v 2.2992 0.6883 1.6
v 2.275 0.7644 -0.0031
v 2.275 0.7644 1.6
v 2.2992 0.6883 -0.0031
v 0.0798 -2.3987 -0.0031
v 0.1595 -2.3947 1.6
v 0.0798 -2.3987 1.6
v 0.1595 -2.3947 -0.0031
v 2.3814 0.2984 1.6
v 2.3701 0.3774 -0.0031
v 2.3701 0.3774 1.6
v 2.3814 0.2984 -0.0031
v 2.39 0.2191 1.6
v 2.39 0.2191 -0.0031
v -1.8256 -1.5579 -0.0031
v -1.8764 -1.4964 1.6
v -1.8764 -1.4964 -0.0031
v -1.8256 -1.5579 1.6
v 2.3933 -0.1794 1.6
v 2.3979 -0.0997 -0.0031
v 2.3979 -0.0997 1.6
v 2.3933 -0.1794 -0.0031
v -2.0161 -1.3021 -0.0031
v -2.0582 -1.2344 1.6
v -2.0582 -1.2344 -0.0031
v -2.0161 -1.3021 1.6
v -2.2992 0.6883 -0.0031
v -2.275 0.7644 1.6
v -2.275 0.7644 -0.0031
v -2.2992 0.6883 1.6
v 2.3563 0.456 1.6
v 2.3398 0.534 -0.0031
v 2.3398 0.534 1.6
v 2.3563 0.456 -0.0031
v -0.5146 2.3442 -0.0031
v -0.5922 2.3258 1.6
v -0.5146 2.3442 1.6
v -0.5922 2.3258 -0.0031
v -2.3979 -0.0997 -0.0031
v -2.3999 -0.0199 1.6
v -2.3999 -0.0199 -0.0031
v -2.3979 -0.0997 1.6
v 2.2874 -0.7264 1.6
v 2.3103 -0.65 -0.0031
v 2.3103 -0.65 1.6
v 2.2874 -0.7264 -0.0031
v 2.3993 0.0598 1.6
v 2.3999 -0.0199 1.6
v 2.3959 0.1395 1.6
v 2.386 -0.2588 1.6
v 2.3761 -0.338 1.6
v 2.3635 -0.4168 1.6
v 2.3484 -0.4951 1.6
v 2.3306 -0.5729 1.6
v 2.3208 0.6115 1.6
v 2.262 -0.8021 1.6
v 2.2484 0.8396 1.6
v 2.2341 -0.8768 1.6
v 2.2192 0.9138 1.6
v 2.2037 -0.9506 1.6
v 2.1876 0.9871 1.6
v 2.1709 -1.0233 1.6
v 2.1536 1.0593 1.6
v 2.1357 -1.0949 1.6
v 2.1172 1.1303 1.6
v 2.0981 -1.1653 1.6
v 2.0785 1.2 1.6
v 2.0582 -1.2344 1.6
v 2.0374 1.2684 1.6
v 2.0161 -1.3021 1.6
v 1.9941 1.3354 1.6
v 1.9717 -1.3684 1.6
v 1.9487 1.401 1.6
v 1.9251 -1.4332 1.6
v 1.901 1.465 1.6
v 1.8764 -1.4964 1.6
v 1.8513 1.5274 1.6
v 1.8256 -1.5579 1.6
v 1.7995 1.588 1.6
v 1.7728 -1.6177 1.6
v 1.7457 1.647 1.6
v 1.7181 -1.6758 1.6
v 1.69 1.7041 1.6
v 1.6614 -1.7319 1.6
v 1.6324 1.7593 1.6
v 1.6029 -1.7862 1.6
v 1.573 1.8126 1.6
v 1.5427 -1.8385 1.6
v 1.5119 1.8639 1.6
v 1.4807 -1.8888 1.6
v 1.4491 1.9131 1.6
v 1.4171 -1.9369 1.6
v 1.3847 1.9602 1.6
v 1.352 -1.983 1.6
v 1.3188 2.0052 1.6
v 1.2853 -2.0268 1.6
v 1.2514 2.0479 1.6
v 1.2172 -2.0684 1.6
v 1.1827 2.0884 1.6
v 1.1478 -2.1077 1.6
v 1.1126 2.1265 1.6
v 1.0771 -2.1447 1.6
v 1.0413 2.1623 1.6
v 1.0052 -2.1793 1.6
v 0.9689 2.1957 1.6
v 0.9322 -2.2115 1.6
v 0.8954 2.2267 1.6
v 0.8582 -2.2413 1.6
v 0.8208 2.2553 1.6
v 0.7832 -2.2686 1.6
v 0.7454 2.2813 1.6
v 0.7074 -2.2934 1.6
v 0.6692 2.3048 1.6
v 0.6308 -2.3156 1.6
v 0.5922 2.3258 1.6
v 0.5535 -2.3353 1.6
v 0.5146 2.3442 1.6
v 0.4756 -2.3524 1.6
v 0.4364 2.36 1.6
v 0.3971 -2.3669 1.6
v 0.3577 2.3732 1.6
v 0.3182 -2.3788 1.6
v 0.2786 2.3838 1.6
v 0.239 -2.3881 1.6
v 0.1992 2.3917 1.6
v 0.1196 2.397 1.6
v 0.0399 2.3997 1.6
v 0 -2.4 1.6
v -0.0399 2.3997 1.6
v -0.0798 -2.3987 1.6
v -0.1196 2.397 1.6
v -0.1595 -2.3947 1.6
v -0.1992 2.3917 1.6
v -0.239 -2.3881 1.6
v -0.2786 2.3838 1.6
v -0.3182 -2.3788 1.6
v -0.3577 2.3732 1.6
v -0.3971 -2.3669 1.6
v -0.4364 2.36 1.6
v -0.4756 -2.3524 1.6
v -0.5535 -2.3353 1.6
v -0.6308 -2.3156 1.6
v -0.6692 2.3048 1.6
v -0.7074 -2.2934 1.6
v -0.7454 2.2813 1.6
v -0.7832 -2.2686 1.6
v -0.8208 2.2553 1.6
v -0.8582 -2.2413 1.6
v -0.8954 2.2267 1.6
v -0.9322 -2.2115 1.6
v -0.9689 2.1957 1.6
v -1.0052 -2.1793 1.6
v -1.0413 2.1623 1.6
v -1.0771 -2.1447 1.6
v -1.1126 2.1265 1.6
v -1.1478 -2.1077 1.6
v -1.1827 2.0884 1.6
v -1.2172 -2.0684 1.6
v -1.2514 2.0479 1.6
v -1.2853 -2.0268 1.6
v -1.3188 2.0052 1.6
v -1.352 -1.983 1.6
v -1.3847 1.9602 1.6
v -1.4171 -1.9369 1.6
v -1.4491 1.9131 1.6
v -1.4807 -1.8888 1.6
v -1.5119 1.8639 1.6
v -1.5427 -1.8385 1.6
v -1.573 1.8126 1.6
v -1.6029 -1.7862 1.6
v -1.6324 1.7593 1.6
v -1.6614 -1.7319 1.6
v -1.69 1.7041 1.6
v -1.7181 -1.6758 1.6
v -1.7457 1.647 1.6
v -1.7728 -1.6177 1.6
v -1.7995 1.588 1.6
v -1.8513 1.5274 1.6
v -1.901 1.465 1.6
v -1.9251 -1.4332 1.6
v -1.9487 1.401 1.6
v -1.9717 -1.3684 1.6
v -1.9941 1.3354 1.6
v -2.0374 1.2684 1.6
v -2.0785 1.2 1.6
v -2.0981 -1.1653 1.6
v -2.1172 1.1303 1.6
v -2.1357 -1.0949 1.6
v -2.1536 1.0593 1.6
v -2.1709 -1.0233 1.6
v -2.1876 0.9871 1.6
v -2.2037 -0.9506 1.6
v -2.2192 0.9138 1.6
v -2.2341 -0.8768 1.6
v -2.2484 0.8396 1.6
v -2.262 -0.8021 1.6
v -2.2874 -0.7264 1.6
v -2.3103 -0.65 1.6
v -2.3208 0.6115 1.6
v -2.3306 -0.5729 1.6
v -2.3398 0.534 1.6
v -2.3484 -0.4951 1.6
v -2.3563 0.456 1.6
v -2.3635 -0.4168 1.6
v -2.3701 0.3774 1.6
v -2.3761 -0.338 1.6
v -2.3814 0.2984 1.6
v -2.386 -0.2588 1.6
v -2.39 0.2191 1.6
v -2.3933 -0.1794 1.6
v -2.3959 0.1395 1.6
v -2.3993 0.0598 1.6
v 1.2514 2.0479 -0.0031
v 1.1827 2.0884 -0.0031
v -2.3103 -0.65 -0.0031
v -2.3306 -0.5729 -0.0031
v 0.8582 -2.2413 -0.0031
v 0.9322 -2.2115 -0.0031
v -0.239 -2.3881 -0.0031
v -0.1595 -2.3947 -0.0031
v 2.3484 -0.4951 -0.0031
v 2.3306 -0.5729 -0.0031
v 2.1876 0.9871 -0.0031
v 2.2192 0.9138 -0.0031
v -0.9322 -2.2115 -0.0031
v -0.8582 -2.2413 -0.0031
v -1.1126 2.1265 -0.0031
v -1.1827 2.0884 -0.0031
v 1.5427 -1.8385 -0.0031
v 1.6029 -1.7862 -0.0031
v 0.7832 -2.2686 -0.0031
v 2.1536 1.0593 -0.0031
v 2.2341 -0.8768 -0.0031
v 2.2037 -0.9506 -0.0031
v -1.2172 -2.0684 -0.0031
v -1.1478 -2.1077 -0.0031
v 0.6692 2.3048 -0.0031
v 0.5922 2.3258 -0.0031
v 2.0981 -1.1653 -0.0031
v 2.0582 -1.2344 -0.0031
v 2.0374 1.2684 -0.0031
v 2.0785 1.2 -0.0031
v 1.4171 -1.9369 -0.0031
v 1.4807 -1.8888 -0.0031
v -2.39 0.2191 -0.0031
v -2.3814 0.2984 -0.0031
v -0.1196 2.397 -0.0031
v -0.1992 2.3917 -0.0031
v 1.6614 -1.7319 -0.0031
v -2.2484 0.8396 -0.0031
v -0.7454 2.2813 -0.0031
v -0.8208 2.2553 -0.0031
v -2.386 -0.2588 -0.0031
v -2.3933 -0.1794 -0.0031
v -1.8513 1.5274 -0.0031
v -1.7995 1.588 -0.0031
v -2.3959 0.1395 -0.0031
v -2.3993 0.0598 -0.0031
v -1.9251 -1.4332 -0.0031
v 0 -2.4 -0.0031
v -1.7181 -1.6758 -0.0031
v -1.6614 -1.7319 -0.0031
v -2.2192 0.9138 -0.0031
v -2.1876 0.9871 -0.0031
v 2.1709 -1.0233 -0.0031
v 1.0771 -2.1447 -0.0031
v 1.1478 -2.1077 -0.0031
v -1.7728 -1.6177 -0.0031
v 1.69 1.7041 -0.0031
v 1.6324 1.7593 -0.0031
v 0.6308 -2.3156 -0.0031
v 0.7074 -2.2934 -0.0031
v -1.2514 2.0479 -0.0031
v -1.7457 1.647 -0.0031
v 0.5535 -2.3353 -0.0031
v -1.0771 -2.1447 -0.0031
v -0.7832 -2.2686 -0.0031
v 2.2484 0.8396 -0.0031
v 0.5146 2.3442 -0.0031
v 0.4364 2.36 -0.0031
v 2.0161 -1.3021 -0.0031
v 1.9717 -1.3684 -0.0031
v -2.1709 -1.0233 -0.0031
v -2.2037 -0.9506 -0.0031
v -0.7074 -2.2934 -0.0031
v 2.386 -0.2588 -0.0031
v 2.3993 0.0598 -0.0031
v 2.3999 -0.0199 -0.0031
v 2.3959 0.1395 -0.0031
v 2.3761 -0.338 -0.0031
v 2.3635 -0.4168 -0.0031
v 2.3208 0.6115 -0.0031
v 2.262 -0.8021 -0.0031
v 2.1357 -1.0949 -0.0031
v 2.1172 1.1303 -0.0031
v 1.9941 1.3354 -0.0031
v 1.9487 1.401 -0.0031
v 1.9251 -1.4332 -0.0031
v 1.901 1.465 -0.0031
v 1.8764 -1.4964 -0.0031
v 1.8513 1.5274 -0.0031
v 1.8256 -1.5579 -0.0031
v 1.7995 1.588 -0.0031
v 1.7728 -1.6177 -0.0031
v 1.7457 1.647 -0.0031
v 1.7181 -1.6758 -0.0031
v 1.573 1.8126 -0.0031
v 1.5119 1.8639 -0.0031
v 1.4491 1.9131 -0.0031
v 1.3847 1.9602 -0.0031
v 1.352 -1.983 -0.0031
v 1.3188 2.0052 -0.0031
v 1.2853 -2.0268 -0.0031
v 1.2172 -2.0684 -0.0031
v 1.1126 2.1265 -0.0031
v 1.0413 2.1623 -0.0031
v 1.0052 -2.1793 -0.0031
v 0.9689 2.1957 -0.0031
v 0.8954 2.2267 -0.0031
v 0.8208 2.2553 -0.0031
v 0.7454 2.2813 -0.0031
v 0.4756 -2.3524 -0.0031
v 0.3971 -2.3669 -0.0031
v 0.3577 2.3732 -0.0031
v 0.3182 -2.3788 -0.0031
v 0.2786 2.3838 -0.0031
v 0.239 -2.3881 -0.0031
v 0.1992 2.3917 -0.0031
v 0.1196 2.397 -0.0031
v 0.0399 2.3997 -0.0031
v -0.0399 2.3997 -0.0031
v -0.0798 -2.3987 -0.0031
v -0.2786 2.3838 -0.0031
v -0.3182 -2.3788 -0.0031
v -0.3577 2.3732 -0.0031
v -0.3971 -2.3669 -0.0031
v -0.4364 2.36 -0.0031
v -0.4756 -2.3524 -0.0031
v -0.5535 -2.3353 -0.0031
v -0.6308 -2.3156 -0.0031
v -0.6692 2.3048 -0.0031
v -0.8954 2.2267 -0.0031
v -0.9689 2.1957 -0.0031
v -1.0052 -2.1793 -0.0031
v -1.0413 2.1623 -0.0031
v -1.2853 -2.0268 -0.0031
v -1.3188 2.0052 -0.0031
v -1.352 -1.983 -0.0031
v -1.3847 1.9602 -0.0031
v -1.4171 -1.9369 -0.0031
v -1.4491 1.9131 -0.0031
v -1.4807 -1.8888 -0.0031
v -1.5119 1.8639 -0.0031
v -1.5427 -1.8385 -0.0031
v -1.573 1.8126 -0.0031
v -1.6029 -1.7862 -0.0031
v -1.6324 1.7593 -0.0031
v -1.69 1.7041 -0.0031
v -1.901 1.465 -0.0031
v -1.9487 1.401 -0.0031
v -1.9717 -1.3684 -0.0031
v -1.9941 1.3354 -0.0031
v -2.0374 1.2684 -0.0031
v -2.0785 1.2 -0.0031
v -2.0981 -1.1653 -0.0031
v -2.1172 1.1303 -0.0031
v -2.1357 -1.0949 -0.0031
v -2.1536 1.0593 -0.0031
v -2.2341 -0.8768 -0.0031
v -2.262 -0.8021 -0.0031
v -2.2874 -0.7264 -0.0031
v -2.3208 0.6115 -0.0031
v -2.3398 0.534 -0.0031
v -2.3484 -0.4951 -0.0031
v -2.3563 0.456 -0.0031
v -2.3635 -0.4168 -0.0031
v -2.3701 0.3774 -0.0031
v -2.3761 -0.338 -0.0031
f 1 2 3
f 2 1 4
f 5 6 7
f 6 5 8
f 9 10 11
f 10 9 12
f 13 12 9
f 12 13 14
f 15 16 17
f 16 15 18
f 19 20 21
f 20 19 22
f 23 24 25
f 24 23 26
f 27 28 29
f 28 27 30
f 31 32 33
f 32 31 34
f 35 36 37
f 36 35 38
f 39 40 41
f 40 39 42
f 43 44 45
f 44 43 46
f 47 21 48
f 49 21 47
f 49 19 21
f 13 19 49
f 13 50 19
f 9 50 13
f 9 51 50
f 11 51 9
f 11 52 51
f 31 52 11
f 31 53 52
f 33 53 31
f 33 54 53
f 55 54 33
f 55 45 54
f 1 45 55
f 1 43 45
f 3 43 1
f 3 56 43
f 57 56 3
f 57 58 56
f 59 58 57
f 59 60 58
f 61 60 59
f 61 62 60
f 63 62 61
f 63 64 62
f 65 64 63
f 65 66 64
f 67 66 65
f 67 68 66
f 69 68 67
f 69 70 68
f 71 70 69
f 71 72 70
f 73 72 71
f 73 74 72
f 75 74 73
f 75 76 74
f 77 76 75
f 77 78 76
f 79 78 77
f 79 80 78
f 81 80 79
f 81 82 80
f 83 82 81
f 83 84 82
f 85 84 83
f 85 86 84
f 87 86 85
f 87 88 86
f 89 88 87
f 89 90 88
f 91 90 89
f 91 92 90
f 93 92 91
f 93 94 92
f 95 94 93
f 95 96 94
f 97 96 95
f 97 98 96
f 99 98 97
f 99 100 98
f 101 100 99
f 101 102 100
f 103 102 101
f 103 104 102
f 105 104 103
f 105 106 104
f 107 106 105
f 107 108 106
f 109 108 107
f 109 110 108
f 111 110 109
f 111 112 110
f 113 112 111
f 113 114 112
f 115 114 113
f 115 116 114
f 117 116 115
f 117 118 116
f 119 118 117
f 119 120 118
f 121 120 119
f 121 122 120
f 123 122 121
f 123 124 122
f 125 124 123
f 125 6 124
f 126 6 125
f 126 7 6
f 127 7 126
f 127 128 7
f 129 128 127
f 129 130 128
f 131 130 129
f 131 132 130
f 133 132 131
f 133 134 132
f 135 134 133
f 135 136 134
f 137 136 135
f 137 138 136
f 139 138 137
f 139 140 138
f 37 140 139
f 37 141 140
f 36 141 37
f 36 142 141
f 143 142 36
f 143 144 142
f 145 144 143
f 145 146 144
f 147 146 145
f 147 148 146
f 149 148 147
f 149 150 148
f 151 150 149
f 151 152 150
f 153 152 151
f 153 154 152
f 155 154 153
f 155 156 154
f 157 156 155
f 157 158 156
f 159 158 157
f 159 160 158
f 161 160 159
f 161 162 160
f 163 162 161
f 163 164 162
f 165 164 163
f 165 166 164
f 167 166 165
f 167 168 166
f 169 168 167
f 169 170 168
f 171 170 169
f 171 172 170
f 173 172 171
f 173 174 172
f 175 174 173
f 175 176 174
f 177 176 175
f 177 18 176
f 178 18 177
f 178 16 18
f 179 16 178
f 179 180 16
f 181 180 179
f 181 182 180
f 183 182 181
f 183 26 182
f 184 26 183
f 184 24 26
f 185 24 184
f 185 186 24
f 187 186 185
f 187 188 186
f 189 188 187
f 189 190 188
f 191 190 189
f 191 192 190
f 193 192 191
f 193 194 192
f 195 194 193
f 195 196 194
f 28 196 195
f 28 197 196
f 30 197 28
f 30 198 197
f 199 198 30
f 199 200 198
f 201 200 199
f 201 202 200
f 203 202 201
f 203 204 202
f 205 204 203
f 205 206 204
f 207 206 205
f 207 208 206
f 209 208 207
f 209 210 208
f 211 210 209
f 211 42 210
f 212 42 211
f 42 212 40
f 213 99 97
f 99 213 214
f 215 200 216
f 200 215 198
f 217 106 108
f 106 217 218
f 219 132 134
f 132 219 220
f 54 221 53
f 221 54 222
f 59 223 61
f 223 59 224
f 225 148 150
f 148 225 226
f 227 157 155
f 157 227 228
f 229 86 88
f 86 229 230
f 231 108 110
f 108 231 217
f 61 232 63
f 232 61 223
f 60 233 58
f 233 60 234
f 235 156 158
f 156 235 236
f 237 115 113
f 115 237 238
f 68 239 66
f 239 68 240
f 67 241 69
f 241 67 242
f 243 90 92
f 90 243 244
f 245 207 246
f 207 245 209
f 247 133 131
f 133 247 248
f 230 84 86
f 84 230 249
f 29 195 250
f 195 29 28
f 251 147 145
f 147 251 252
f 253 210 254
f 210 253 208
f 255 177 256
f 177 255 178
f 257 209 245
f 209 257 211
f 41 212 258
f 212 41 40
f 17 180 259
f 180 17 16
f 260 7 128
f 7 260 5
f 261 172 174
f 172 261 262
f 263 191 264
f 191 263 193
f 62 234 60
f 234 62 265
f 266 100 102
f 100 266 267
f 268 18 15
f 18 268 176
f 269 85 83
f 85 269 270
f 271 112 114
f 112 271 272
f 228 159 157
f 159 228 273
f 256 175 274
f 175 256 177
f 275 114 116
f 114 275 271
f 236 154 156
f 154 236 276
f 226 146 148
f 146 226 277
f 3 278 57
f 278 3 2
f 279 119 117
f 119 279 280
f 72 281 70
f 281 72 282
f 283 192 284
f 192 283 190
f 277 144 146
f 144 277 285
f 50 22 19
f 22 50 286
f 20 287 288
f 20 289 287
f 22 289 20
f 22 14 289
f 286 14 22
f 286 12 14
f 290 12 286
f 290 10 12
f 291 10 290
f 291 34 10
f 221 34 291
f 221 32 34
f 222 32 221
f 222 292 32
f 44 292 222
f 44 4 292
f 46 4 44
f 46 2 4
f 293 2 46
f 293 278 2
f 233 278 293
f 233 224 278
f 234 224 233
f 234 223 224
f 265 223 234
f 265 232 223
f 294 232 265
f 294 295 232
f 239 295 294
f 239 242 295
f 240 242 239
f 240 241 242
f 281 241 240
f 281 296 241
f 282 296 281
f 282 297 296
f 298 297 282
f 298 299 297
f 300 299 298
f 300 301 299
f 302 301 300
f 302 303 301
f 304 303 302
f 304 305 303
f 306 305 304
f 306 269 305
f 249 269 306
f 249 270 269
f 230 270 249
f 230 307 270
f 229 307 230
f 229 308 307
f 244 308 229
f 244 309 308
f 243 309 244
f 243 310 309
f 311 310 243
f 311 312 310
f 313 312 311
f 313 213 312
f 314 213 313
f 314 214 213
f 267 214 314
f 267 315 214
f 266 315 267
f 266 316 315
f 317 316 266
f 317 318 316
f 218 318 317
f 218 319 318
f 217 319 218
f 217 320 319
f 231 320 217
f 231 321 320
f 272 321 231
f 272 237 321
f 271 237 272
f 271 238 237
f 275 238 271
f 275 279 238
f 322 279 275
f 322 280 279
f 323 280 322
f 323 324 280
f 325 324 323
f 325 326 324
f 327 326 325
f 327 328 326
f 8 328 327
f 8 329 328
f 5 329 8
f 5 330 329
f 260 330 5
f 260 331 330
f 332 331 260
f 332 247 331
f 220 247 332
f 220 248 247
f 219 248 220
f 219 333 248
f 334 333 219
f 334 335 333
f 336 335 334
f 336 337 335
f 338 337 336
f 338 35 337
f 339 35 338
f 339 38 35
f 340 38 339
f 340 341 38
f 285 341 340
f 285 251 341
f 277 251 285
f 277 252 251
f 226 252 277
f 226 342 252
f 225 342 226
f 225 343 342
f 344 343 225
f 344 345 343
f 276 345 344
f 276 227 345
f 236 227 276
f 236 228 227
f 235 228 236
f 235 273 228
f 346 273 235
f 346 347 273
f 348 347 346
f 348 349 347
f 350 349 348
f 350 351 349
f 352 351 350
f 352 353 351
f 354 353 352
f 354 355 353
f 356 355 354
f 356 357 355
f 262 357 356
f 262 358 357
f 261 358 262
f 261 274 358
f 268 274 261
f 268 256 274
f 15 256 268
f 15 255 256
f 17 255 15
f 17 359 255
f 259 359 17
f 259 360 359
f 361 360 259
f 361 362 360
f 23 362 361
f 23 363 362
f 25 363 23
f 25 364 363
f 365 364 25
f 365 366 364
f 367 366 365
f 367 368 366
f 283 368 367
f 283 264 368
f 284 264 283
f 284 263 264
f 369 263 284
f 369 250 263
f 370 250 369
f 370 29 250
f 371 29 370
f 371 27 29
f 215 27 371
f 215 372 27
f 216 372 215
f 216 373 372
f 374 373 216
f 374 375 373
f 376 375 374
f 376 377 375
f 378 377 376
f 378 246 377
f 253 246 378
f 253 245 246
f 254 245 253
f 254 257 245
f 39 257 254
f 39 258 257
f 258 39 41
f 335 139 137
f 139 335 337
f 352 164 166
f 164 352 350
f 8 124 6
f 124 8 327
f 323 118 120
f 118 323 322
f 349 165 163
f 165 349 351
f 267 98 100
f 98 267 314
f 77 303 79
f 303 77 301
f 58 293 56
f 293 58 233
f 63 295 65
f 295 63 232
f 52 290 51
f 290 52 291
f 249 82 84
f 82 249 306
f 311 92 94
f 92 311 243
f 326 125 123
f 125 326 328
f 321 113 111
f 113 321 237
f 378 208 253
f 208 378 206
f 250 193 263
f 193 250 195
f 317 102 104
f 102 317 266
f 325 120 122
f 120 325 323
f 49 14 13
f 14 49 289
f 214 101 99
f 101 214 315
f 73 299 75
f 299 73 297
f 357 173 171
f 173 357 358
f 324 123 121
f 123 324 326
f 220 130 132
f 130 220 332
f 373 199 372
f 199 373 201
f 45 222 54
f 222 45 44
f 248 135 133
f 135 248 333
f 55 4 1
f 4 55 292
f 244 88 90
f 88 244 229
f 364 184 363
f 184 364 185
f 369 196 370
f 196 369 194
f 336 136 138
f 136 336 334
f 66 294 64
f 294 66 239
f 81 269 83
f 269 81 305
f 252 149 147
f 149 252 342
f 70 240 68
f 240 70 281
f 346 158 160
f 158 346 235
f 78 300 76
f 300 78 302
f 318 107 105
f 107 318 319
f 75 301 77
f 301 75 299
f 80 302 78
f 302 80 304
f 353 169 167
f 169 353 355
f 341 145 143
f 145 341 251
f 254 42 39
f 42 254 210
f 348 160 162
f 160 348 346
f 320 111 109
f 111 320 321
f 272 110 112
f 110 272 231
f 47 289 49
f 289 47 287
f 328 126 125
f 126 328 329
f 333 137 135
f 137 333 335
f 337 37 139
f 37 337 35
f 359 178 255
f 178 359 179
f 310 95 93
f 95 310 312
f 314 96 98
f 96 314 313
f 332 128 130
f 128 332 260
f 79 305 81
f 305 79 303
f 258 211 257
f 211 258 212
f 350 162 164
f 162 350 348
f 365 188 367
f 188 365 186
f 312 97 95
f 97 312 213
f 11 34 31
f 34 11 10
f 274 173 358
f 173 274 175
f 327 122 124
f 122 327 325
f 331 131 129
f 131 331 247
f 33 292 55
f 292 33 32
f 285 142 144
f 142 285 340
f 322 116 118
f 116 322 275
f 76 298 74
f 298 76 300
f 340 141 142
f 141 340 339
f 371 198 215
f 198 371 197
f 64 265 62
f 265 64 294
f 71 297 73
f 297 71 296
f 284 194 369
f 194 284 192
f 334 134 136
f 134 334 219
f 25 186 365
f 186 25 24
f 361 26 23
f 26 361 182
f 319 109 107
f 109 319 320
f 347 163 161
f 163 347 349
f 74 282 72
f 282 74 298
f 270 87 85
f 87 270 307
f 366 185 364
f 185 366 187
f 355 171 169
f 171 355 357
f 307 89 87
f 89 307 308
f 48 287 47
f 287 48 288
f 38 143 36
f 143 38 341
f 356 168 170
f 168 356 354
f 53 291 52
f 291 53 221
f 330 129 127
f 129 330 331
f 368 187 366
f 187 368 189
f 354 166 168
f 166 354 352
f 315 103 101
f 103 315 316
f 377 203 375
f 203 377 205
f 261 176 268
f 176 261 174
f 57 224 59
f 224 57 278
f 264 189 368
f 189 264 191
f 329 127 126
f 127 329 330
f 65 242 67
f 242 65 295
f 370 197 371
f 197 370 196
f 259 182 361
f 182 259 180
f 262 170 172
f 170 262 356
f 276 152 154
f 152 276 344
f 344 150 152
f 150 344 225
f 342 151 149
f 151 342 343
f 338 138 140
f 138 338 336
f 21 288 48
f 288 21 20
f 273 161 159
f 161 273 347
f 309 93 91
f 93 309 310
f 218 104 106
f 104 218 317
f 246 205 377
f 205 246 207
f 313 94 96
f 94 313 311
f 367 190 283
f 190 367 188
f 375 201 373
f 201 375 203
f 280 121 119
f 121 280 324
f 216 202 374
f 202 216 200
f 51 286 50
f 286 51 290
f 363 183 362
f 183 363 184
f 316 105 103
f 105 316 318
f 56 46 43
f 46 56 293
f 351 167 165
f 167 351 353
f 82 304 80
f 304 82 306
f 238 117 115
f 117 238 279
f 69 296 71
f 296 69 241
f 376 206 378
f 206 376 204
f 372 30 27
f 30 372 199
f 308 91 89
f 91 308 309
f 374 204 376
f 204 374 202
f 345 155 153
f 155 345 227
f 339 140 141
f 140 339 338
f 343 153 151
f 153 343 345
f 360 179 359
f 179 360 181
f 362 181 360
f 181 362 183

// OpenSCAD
use <../lib.scad>
use <s/3960s01.scad>
use <s/3960s03.scad>
$fa=1; $fs=0.2;
function ldraw_lib__3960(realsolid=false) = [
// 0 Dish  4 x  4 Inverted
// 0 Name: 3960.dat
// 0 Author: James Jessiman
// 0 !LDRAW_ORG Part UPDATE 2010-02
// 0 !LICENSE Licensed under CC BY 2.0 and CC BY 4.0 : see CAreadme.txt
// 
// 0 BFC CERTIFY CW
  [0,"BFC","CERTIFY"],
  [0,"BFC","CW"],
// 
// 0 !KEYWORDS Radar Dish, Round, Space
// 
// 0 !HISTORY 2003-06-27 [Steffen] re-created part using existing subfiles
// 0 !HISTORY 2004-09-15 [PTadmin] Official Update 2004-03
// 0 !HISTORY 2007-06-30 [PTadmin] Header formatted for Contributor Agreement
// 0 !HISTORY 2008-07-01 [PTadmin] Official Update 2008-01
// 0 !HISTORY 2010-05-09 [cwdee] Remove CATEGORY Round
// 0 !HISTORY 2010-07-05 [PTadmin] Official Update 2010-02
// 
// 
// 1 16 0 0 0 1 0 0 0 1 0 0 0 1 s\3960s03.dat
  [1,16,0,0,0,1,0,0,0,1,0,0,0,1, ldraw_lib__s__3960s03(realsolid)],
// 1 16 0 0 0 1 0 0 0 1 0 0 0 1 s\3960s01.dat
  [1,16,0,0,0,1,0,0,0,1,0,0,0,1, ldraw_lib__s__3960s01(realsolid)],
// 0
];
module ldraw_lib__3960(step=0, col=false, unit=2/5, alt=false, line=0.2, solid=!$preview)
    makepoly(ldraw_lib__3960(solid), step=step, col=col, unit=unit, alt=alt, line=line, solid=solid);
ldraw_lib__3960(line=0.2);
